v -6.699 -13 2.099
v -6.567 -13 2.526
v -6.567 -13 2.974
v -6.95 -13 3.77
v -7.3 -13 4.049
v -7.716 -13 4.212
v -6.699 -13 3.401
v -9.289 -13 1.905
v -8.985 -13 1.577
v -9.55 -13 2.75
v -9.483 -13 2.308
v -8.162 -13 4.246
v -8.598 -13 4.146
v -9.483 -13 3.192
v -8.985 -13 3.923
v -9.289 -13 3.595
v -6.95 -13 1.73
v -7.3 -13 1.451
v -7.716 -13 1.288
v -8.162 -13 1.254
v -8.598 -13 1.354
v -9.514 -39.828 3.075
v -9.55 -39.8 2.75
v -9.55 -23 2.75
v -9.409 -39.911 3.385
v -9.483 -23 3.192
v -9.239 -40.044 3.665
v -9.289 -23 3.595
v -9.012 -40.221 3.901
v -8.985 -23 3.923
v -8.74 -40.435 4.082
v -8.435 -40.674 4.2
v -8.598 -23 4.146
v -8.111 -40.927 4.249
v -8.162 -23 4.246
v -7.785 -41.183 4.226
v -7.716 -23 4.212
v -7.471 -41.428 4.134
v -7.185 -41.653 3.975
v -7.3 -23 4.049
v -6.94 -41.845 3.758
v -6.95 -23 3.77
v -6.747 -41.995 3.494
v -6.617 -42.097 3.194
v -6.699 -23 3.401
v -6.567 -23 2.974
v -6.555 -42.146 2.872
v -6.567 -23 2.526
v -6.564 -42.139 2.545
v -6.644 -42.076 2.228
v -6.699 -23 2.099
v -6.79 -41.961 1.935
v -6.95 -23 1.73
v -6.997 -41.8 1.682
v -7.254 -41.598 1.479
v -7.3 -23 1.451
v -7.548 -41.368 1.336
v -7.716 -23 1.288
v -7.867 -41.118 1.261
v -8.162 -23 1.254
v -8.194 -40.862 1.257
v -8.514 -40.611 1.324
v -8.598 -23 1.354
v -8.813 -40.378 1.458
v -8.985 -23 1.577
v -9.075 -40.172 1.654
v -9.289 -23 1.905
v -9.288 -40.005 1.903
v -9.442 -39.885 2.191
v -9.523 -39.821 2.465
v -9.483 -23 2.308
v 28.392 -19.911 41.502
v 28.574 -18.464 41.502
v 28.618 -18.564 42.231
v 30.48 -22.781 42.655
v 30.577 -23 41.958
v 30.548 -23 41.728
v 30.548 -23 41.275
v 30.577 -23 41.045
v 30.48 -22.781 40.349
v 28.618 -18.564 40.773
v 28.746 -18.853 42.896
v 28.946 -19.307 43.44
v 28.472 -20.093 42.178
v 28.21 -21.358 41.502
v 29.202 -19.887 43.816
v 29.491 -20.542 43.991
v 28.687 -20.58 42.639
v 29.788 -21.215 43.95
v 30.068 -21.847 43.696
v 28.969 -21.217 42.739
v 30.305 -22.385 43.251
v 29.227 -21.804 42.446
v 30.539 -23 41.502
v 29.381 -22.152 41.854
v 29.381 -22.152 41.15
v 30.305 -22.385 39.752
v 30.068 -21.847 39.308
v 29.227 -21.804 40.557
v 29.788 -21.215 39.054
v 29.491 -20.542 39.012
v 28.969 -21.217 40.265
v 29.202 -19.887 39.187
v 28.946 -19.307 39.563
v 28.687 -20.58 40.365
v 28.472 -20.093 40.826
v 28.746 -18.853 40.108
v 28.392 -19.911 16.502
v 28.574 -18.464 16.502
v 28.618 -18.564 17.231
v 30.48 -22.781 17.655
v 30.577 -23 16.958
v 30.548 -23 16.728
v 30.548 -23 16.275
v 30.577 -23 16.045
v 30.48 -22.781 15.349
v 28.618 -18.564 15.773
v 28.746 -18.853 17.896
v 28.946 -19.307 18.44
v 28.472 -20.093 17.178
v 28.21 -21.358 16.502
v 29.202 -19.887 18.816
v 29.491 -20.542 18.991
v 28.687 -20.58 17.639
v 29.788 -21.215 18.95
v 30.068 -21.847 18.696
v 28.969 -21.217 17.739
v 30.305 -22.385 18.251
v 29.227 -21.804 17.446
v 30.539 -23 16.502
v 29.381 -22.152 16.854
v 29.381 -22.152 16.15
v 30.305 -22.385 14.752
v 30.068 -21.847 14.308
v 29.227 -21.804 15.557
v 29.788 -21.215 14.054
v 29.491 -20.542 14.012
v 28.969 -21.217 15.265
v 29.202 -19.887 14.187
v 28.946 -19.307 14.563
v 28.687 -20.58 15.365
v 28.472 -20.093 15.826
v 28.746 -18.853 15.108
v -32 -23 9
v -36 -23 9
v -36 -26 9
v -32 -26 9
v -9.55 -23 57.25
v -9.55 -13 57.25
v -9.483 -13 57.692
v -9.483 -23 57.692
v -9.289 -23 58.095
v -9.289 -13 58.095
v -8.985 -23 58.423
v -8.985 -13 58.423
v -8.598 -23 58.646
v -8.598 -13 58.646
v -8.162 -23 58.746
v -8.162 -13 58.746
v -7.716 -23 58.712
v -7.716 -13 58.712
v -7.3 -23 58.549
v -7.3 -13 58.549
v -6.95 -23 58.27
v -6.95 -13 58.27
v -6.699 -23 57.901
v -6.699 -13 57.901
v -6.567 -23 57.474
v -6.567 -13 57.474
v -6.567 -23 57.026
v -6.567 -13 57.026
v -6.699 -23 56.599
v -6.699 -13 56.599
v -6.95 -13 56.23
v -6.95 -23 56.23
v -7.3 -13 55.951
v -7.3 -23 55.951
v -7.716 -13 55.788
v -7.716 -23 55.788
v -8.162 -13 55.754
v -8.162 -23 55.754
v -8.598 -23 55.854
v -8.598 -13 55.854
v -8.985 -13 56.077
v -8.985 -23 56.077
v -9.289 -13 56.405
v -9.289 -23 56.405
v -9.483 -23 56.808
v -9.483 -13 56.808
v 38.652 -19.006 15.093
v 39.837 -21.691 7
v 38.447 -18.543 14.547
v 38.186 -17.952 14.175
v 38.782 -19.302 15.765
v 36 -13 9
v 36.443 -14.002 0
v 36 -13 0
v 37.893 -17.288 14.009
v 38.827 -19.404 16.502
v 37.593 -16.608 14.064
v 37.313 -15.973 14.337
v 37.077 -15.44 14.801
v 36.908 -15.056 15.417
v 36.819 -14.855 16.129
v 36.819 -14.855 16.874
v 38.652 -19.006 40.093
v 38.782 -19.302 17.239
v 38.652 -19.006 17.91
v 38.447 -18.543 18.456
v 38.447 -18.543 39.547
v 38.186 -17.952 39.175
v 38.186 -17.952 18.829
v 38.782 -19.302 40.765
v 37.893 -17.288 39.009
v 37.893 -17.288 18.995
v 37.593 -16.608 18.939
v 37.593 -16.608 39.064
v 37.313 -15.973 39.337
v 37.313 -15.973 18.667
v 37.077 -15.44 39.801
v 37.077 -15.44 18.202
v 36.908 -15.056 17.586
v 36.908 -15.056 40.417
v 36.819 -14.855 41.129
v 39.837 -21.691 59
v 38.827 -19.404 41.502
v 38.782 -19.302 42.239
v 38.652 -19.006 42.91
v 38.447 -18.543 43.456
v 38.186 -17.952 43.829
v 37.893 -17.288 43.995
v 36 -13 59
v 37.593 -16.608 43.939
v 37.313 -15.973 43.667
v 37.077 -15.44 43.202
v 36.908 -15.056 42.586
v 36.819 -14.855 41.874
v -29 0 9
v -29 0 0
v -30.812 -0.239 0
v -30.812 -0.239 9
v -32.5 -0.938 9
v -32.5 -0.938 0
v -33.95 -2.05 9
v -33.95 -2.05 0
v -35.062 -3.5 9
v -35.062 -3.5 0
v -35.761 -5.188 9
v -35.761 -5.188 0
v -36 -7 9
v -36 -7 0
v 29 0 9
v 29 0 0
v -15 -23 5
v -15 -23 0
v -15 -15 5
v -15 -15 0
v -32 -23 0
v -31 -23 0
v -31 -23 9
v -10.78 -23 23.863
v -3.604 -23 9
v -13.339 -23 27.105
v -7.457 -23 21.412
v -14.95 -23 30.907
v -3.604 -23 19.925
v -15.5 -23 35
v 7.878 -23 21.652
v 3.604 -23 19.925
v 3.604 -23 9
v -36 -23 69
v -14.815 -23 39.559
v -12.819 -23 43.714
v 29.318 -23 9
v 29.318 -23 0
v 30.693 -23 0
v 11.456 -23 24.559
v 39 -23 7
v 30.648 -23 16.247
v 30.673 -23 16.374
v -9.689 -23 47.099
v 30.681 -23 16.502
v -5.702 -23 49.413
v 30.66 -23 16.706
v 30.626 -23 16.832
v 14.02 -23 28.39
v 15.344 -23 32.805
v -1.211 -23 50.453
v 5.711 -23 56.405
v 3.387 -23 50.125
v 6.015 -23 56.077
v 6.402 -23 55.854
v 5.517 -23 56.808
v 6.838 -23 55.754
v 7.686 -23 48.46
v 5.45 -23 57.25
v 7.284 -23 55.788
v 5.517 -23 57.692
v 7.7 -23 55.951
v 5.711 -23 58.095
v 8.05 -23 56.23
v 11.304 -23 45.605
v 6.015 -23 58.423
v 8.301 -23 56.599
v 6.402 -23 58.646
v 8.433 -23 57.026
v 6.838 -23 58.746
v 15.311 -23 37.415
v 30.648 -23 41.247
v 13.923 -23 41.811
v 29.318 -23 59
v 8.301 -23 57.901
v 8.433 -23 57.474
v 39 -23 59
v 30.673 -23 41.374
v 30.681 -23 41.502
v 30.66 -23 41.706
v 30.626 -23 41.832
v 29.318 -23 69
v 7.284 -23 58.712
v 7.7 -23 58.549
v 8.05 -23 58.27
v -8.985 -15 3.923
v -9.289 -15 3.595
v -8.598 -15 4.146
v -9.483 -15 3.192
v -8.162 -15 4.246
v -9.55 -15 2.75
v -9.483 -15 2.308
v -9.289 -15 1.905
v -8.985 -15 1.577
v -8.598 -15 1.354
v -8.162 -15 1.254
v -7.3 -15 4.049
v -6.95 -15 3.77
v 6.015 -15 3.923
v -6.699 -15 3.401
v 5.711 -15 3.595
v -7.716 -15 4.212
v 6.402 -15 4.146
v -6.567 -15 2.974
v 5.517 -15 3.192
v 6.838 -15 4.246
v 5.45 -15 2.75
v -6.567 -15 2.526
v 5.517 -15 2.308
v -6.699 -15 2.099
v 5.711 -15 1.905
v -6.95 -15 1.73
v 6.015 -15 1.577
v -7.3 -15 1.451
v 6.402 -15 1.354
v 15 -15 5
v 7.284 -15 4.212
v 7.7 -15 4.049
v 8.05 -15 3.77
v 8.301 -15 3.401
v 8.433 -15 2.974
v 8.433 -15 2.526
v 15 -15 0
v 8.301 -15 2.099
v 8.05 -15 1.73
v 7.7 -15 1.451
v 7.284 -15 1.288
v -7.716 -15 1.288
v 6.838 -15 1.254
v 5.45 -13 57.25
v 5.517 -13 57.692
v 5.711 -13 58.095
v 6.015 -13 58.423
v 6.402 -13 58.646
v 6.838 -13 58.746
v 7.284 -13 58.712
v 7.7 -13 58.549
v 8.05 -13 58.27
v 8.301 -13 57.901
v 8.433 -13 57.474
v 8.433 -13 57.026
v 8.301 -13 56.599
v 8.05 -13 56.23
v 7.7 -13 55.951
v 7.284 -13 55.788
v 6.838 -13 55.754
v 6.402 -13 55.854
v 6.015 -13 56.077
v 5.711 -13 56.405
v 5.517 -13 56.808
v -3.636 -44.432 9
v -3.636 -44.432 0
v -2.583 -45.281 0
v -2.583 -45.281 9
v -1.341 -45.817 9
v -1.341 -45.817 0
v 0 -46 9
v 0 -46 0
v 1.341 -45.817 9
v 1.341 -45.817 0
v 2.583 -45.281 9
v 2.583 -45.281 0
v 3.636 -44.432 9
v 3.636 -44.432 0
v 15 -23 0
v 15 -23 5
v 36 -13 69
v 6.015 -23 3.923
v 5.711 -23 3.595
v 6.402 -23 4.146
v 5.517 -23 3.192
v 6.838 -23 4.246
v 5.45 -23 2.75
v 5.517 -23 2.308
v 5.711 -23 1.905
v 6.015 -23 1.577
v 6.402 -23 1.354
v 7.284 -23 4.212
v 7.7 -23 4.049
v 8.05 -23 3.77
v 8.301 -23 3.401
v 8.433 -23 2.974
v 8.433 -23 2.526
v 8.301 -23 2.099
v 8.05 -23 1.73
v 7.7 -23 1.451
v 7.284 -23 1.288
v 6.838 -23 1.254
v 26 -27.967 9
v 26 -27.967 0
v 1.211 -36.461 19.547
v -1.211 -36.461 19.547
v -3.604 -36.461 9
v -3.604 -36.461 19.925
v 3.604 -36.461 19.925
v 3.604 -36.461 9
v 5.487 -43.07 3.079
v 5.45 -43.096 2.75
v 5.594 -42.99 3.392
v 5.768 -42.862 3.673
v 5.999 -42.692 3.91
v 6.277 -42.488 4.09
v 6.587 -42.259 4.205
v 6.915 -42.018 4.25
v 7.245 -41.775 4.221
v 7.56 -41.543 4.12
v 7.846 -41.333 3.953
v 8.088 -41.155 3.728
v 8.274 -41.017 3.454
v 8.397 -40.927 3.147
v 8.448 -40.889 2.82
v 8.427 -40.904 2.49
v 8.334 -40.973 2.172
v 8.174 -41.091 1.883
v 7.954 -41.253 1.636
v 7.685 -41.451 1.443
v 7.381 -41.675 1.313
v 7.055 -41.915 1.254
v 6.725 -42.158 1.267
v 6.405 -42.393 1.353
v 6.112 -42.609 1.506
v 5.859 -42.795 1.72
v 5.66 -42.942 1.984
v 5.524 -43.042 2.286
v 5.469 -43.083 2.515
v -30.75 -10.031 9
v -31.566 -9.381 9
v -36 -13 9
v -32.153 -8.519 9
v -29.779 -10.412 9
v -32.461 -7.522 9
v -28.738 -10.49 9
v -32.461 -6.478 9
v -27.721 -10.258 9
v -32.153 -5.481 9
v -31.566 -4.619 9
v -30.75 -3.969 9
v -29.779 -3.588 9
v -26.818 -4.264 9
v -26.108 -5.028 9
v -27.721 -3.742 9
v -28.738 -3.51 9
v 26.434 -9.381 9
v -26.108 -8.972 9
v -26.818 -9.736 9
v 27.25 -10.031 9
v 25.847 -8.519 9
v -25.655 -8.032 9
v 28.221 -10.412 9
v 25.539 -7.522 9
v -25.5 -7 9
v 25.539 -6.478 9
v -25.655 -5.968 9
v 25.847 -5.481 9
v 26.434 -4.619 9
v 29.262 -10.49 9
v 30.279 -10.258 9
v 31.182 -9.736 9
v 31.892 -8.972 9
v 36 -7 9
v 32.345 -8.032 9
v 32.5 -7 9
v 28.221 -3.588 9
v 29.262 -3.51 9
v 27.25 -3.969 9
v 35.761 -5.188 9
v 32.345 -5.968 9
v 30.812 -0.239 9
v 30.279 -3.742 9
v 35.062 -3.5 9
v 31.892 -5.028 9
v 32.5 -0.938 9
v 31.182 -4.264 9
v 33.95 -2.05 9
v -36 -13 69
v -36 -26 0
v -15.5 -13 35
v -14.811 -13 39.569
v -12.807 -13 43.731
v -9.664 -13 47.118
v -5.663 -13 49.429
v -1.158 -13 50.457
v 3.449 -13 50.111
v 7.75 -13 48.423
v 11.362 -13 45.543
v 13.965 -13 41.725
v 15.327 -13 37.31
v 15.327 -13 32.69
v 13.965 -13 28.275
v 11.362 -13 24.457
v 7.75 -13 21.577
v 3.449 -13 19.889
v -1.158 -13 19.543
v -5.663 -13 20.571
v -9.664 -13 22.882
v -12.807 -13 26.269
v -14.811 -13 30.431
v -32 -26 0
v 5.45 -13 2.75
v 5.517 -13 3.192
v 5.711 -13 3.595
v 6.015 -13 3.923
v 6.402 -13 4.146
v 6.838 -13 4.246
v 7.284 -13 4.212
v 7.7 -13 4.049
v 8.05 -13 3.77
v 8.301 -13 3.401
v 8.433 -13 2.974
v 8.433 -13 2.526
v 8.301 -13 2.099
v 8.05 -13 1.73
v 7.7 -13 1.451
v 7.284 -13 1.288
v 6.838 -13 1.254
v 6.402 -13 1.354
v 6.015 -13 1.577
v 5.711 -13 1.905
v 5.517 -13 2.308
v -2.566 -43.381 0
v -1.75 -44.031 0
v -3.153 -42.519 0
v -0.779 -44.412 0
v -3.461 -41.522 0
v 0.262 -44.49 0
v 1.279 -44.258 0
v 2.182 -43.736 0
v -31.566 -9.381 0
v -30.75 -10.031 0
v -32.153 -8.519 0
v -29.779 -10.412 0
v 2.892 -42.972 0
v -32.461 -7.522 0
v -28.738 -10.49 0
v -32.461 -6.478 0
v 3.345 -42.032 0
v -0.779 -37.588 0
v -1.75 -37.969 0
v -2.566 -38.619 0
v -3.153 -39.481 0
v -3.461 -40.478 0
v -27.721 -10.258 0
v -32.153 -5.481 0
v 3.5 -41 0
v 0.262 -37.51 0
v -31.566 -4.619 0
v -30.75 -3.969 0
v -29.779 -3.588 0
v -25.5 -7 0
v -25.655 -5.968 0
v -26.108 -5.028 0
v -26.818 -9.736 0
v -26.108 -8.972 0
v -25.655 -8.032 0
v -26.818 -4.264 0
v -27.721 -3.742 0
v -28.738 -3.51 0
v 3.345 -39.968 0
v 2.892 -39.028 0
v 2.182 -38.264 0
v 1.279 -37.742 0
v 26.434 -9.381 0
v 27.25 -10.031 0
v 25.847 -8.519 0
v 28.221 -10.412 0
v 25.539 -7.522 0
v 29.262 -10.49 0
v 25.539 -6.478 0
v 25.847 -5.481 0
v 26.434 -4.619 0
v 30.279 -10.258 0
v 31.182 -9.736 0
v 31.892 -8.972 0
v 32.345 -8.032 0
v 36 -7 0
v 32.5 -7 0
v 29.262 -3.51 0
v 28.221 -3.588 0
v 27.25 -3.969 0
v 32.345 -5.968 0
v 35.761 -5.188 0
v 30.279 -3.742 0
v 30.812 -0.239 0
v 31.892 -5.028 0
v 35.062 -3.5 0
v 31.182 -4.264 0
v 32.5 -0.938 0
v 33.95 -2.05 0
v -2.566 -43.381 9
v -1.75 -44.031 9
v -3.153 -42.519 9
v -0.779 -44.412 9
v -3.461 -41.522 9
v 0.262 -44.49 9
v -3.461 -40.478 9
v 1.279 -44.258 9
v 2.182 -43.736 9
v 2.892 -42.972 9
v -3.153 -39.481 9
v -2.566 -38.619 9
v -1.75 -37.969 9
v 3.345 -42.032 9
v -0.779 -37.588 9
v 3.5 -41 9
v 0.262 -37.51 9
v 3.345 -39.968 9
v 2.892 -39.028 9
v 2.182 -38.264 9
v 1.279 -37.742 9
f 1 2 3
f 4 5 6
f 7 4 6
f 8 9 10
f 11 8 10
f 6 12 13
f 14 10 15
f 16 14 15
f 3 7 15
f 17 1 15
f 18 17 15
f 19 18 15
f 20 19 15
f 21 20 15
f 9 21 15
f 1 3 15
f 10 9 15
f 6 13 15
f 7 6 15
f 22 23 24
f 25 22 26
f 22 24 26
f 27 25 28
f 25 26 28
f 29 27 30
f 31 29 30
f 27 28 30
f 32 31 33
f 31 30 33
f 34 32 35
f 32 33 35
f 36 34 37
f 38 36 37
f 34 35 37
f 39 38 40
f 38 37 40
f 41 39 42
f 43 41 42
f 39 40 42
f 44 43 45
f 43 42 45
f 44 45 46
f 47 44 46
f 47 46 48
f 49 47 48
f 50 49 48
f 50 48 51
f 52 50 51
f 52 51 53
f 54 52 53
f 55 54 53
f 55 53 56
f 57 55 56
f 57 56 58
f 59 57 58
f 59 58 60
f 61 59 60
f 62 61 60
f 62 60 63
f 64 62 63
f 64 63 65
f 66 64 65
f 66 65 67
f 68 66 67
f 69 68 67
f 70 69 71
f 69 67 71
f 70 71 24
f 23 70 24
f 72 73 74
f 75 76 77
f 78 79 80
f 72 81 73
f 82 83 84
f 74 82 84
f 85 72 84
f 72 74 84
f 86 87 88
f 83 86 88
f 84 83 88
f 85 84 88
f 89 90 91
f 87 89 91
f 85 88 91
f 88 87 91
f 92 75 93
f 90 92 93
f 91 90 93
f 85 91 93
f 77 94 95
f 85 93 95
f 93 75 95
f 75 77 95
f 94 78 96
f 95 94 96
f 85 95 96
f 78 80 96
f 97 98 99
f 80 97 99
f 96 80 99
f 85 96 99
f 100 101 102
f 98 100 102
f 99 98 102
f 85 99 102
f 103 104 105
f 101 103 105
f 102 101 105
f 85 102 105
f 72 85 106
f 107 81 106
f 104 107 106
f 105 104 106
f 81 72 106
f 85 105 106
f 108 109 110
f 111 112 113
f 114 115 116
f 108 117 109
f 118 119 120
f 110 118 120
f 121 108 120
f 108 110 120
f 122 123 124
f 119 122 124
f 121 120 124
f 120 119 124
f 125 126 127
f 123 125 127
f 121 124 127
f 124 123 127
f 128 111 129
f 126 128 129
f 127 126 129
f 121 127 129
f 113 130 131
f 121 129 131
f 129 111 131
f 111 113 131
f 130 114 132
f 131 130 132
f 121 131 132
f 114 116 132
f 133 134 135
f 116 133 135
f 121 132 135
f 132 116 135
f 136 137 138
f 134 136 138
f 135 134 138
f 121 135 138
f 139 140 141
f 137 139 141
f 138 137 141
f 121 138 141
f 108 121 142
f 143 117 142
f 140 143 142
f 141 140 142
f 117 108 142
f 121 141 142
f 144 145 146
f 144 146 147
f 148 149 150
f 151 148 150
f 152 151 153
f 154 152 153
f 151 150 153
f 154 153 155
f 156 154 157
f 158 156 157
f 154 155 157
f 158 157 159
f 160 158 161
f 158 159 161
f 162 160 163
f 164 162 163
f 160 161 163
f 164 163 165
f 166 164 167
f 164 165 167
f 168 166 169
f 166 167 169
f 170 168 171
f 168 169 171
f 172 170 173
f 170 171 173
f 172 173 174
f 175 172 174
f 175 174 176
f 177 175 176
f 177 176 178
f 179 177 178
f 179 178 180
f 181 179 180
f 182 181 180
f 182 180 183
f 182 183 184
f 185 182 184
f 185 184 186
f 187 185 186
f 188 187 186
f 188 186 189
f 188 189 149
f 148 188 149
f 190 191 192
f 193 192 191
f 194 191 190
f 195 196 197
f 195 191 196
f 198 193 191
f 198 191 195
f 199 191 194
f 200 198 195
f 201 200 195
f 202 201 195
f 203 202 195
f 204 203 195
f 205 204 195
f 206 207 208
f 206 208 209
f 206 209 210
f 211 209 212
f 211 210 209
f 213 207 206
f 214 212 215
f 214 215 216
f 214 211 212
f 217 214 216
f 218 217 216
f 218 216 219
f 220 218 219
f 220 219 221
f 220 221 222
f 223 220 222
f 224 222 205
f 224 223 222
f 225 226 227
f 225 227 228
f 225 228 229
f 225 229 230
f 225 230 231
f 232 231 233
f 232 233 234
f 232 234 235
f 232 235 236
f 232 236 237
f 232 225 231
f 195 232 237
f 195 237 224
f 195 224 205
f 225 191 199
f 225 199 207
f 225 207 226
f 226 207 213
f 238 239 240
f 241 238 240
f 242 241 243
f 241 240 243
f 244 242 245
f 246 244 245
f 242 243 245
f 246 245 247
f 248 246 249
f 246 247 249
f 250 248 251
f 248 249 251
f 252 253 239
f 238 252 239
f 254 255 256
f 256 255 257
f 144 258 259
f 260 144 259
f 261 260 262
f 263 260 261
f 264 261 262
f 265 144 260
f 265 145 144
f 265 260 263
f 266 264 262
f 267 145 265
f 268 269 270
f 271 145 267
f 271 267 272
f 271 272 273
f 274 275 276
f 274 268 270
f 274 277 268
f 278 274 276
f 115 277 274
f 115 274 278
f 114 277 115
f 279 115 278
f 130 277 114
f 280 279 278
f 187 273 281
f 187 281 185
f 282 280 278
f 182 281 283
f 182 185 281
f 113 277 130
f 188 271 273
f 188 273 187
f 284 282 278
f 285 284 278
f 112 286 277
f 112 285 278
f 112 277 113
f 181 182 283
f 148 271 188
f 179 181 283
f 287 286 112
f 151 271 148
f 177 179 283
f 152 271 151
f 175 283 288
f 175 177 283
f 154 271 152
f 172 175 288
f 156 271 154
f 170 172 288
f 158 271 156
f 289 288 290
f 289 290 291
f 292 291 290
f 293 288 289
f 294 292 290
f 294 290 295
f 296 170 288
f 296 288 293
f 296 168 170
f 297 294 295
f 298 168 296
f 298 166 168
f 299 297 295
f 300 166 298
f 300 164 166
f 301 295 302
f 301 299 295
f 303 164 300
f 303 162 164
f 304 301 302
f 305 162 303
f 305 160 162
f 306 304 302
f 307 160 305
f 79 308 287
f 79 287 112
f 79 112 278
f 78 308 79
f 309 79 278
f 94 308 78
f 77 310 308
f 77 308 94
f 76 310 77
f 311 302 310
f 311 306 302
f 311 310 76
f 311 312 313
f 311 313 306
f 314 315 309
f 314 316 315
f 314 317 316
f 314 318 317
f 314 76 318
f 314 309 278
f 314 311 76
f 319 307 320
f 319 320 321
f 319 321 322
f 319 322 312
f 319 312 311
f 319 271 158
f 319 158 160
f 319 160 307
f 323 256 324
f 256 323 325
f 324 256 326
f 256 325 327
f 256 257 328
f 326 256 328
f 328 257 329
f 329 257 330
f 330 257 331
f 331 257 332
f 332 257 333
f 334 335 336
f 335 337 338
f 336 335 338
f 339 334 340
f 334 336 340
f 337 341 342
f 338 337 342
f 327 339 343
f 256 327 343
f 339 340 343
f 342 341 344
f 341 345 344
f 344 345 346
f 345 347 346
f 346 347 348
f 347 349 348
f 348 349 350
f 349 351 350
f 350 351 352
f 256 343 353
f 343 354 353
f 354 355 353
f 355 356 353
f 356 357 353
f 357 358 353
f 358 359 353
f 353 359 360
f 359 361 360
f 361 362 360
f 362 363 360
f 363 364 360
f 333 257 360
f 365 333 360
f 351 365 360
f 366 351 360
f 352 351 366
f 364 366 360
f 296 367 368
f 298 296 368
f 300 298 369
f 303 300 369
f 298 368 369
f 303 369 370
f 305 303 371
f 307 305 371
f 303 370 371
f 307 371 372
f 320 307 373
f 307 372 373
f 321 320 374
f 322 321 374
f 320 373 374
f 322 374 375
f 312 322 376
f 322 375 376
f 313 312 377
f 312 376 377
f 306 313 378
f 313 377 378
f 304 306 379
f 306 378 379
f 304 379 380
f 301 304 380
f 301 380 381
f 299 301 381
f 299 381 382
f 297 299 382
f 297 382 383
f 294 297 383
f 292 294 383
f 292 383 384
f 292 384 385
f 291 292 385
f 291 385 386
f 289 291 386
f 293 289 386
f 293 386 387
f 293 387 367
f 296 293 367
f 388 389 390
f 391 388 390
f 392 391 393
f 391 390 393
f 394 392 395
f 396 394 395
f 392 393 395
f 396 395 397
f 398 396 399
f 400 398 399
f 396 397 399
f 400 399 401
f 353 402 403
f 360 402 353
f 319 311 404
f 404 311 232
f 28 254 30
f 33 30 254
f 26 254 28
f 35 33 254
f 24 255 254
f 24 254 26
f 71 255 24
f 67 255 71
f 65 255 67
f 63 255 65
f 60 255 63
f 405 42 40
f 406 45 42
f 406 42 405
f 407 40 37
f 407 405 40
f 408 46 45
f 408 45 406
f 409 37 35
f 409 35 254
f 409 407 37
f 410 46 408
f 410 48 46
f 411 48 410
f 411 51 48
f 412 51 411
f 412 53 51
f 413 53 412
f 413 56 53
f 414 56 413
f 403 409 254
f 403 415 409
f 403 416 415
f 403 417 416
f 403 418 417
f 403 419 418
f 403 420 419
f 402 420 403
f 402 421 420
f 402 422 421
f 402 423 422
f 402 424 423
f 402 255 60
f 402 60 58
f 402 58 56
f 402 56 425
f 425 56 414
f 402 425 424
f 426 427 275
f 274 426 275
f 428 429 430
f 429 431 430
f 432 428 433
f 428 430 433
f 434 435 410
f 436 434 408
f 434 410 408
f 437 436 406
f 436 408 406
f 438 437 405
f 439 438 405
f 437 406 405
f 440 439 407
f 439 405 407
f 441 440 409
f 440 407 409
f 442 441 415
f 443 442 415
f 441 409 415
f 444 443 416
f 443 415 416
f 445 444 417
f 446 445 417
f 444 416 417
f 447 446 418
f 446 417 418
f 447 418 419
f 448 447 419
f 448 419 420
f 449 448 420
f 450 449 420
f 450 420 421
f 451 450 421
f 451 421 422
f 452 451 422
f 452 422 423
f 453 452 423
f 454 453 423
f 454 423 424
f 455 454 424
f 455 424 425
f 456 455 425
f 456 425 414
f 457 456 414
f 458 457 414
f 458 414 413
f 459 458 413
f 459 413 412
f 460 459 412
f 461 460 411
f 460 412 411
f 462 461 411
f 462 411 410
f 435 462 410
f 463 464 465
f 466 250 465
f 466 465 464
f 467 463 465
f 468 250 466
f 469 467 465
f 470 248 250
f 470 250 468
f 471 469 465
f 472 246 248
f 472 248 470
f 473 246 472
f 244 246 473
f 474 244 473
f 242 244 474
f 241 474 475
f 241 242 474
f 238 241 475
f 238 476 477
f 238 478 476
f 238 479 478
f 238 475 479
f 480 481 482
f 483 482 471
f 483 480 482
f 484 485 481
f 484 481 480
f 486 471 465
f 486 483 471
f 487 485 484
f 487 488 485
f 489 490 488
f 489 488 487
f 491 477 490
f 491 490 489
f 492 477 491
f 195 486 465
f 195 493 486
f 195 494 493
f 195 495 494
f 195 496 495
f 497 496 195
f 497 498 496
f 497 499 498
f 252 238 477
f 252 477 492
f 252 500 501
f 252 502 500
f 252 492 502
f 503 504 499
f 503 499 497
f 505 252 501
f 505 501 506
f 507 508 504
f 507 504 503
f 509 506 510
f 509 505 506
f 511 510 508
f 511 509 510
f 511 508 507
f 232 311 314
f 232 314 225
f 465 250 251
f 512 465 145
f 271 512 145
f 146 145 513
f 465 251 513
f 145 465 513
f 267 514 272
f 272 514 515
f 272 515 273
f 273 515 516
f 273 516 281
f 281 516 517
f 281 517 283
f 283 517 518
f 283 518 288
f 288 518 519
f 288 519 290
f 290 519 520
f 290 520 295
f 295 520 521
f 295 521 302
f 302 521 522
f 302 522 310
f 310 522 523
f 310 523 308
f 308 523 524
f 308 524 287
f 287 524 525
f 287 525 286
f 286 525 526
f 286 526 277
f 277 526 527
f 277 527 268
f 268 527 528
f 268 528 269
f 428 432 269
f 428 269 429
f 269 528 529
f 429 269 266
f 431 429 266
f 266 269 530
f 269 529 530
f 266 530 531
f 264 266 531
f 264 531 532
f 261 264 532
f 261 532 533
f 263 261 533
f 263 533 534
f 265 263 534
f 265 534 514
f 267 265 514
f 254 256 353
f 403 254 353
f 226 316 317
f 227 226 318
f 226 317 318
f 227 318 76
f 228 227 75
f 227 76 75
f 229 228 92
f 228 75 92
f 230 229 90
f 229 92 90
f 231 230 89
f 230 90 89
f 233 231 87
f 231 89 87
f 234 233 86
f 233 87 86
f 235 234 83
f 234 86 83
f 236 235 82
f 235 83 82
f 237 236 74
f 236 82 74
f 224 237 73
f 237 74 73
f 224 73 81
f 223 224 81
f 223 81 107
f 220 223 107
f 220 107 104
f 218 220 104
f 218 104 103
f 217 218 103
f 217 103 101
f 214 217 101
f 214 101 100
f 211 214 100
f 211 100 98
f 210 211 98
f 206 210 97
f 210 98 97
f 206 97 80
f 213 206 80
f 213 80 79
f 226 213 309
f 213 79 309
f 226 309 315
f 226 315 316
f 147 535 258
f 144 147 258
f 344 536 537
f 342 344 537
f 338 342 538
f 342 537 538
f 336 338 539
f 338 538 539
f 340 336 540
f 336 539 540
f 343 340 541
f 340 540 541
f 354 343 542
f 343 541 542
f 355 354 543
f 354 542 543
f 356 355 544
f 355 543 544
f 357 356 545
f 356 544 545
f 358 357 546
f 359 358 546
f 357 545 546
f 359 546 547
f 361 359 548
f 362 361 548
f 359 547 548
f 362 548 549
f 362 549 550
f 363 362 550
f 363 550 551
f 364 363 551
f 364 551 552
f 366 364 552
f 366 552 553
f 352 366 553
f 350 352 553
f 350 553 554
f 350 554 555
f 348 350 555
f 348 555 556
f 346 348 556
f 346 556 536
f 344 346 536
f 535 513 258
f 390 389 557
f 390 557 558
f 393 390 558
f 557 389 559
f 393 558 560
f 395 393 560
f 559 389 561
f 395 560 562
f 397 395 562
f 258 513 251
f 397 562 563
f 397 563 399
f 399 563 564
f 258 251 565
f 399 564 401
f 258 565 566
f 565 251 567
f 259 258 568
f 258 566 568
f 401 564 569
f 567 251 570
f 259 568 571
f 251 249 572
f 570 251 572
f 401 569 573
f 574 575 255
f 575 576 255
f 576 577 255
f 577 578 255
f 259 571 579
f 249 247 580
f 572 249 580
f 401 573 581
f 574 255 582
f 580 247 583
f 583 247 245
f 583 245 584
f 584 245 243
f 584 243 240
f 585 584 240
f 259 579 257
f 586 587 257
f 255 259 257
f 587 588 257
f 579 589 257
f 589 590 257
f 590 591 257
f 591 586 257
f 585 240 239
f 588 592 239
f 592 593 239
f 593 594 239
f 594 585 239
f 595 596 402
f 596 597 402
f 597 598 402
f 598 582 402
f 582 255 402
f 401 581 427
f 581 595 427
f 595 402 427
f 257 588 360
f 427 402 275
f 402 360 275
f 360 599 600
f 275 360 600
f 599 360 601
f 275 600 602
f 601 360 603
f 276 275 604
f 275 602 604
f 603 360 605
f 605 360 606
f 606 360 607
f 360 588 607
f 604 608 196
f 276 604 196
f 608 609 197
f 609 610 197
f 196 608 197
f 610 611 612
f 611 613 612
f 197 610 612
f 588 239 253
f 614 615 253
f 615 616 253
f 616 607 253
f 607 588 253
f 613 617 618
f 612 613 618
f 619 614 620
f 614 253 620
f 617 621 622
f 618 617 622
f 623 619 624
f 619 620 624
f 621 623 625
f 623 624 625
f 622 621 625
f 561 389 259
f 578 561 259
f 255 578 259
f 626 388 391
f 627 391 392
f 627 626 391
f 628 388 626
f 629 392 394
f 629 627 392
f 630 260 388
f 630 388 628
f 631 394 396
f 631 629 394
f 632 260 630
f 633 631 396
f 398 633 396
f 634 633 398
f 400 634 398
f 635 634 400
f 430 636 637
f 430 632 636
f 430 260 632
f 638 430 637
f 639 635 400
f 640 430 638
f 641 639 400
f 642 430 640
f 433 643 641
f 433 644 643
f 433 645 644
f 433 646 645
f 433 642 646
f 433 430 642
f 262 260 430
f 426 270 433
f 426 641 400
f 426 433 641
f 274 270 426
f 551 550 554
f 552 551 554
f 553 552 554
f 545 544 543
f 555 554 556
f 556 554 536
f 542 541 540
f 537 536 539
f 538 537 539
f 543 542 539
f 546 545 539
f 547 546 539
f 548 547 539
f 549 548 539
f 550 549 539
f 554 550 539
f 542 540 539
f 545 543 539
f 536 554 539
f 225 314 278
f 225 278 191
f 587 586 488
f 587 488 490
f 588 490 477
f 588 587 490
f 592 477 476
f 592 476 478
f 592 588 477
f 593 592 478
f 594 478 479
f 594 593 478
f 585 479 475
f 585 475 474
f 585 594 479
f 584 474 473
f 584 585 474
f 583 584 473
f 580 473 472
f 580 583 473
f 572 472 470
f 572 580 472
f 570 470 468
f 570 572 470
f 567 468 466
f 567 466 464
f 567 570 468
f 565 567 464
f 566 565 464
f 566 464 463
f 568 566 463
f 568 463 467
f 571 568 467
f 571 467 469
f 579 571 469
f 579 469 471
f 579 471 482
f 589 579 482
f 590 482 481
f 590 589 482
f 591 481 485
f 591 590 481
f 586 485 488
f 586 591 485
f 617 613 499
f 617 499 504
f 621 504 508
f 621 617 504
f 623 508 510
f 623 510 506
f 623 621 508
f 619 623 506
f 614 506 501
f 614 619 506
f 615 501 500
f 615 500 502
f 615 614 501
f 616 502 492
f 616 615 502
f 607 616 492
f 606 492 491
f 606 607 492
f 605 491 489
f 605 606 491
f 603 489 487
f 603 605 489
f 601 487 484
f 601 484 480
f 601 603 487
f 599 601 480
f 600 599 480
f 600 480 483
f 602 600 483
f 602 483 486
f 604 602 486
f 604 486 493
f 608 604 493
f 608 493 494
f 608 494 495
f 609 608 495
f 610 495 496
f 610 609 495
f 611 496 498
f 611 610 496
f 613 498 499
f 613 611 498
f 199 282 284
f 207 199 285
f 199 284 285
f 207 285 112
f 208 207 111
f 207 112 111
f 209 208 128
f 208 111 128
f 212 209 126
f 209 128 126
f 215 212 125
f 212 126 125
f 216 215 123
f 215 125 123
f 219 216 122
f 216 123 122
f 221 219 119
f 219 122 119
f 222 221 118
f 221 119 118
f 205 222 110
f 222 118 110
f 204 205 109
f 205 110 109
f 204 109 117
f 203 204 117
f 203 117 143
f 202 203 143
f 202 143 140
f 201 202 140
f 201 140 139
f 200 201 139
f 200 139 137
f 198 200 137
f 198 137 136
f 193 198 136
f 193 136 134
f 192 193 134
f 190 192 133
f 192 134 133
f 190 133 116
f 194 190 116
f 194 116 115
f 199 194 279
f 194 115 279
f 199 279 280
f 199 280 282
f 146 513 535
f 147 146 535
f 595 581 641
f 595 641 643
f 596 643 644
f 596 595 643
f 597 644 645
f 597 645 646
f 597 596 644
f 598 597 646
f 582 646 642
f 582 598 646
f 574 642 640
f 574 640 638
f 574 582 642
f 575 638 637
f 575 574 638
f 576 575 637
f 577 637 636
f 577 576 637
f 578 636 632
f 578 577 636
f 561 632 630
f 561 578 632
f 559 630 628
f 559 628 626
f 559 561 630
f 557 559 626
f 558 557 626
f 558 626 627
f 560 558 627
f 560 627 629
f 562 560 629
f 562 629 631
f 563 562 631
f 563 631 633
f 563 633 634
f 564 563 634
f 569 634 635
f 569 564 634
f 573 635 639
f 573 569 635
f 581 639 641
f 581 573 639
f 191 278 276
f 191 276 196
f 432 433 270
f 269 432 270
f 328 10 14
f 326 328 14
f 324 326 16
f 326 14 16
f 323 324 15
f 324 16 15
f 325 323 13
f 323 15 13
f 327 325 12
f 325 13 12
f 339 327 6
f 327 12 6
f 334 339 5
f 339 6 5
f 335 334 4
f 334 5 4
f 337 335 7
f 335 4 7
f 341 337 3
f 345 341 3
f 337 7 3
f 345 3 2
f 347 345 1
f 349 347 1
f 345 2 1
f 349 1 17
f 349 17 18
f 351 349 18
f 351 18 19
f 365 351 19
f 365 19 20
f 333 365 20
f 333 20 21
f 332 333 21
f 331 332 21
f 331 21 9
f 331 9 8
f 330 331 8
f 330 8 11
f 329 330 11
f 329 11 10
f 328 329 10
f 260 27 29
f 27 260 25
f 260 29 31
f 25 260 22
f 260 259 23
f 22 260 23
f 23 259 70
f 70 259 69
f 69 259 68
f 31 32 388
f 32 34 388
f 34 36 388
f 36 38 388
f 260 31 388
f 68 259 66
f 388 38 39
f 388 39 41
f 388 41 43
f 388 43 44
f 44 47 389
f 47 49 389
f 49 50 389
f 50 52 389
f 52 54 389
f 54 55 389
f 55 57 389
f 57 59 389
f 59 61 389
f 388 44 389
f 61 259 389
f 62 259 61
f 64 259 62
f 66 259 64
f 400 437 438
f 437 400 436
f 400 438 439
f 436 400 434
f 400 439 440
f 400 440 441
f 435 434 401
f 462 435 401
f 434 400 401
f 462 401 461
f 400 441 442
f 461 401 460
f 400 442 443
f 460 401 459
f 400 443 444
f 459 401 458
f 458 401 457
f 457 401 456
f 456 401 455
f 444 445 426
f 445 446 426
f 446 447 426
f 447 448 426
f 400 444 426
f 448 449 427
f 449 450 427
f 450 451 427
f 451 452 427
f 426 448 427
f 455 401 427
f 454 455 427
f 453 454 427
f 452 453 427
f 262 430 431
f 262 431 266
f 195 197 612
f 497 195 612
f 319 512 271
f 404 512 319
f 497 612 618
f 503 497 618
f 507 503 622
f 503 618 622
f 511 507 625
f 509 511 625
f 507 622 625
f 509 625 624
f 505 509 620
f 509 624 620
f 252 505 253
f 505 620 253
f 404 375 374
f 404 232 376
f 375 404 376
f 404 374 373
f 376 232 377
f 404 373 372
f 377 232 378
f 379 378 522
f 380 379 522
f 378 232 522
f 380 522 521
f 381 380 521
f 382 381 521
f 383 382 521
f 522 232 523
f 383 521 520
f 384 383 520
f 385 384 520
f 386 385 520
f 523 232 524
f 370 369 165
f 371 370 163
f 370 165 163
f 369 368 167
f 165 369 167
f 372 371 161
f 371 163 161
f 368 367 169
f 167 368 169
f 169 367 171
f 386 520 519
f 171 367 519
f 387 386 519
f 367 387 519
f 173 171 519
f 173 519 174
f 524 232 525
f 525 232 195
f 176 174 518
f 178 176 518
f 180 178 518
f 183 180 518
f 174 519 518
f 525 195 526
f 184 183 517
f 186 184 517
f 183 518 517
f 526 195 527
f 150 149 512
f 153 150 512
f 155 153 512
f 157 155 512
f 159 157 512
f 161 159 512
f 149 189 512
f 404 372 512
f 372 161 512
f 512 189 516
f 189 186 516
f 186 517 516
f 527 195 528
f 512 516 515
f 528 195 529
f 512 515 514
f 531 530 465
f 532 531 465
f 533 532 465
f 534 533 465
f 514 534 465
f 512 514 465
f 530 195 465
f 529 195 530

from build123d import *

# Parameters (mm, degrees)
F0_R      = 3.5
F1_DEPTH  = 9
F2_W      = 30
F2_H      = 8
F3_DEPTH  = 5
F5_DEPTH  = 60
F6_DEPTH  = 50
F7_DEPTH  = 9
F8_SIZE   = 7
F10_D     = 5
F10_DEPTH = 9
F10_TIP   = 1.5021515476
F11_W     = 7.2082555853
F11_H     = 16.9959962368
F12_DEPTH = 25
F13_R     = 1.5
F14_DEPTH = 33.001
F16_R     = 15.5
F17_DEPTH = 25


with BuildPart() as f1:
    # F0 (on Top) → F1 (new body)
    with BuildSketch(Plane.XY):
        with BuildLine():
            Line((-36, -7), (-36, -26))
            Line((-36, -26), (-32, -26))
            Line((-32, -26), (-32, -23))
            Line((-32, -23), (-31, -23))
            Line((-31, -23), (-3.6364618823, -44.4316388182))
            ThreePointArc((-3.6364618823, -44.4316388182), (0, -46), (3.6364618823, -44.4316388182))
            Line((3.6364618823, -44.4316388182), (26, -27.9666295471))
            Line((26, -27.9666295471), (36, -13))
            Line((36, -13), (36, -7))
            ThreePointArc((36, -7), (33.9497474683, -2.0502525317), (29, 0))
            Line((29, 0), (-29, 0))
            ThreePointArc((-29, 0), (-33.9497474683, -2.0502525317), (-36, -7))
        make_face()
        with Locations((0, -41)):
            Circle(F0_R, mode=Mode.SUBTRACT)
        with Locations((-29, -7)):
            Circle(F0_R, mode=Mode.SUBTRACT)
        with Locations((29, -7)):
            Circle(F0_R, mode=Mode.SUBTRACT)
    extrude(amount=F1_DEPTH)

    # F2 (on face) → F3 (cut)
    with BuildSketch(Plane.XY):
        with Locations((0, -19)):
            Rectangle(F2_W, F2_H)
    extrude(amount=F3_DEPTH, mode=Mode.SUBTRACT)

    # F4 (on face) → F5 (join)
    with BuildSketch(Plane.XY.offset(9)):
        Polygon((36, -13), (-36, -13), (-36, -23), (-32, -23), (-31, -23), (29.3184689522, -23), align=None)
    extrude(amount=F5_DEPTH)

    # F4 (on face) → F6 (join)
    with BuildSketch(Plane.XY.offset(9)):
        Polygon((39.8366187696, -21.6908202384), (36, -13), (29.3184689522, -23), (39, -23), align=None)
    extrude(amount=F6_DEPTH)

    # F4 (on face) → F7 (join)
    with BuildSketch(Plane.XY.offset(9)):
        Polygon((39.8366187696, -21.6908202384), (36, -13), (29.3184689522, -23), (39, -23), align=None)
    extrude(amount=-F7_DEPTH)

    # F8
    f8_edges = [f1.edges().sort_by_distance(p)[0] for p in [
        (39.418309, -22.34541, 0),
    ]]
    chamfer(f8_edges, length=F8_SIZE)

    # F10
    with Locations(Plane(origin=(25.3255301757, 11.1801189941, 0), x_dir=(-0.4038546073, 0.914823183, 0), z_dir=(0.914823183, 0.4038546073, 0))):
        with Locations((-30.9314672426, 16.5017858054), (-30.9314672426, 41.5017858054)):
            Hole(F10_D / 2, depth=F10_DEPTH)
            with Locations((0, 0, -(F10_DEPTH + F10_TIP / 2))):  # 118° drill point
                Cone(0, F10_D / 2, F10_TIP, mode=Mode.SUBTRACT)

    # F11 (on face) → F12 (join)
    with BuildSketch(Plane.XY.offset(9)):
        with Locations((0, -27.9626622796)):
            Rectangle(F11_W, F11_H)
    extrude(amount=F12_DEPTH)

    # F13 (on face) → F14 (cut, through all)
    with BuildSketch(Plane(origin=(0, -13, 0), x_dir=(-1, 0, 0), z_dir=(0, 1, 0))):
        with Locations((-6.9500040114, 2.750000149)):
            Circle(F13_R)
        with Locations((8.0499959886, 2.750000149)):
            Circle(F13_R)
        with Locations((8.0499959886, 57.250000149)):
            Circle(F13_R)
        with Locations((-6.9500040114, 57.250000149)):
            Circle(F13_R)
    extrude(amount=-F14_DEPTH, mode=Mode.SUBTRACT)

    # F16 (on face) → F17 (cut)
    with BuildSketch(Plane(origin=(0, -13, 0), x_dir=(-1, 0, 0), z_dir=(0, 1, 0))):
        with Locations((0, 35)):
            Circle(F16_R)
    extrude(amount=-F17_DEPTH, mode=Mode.SUBTRACT)


solid = f1.part
